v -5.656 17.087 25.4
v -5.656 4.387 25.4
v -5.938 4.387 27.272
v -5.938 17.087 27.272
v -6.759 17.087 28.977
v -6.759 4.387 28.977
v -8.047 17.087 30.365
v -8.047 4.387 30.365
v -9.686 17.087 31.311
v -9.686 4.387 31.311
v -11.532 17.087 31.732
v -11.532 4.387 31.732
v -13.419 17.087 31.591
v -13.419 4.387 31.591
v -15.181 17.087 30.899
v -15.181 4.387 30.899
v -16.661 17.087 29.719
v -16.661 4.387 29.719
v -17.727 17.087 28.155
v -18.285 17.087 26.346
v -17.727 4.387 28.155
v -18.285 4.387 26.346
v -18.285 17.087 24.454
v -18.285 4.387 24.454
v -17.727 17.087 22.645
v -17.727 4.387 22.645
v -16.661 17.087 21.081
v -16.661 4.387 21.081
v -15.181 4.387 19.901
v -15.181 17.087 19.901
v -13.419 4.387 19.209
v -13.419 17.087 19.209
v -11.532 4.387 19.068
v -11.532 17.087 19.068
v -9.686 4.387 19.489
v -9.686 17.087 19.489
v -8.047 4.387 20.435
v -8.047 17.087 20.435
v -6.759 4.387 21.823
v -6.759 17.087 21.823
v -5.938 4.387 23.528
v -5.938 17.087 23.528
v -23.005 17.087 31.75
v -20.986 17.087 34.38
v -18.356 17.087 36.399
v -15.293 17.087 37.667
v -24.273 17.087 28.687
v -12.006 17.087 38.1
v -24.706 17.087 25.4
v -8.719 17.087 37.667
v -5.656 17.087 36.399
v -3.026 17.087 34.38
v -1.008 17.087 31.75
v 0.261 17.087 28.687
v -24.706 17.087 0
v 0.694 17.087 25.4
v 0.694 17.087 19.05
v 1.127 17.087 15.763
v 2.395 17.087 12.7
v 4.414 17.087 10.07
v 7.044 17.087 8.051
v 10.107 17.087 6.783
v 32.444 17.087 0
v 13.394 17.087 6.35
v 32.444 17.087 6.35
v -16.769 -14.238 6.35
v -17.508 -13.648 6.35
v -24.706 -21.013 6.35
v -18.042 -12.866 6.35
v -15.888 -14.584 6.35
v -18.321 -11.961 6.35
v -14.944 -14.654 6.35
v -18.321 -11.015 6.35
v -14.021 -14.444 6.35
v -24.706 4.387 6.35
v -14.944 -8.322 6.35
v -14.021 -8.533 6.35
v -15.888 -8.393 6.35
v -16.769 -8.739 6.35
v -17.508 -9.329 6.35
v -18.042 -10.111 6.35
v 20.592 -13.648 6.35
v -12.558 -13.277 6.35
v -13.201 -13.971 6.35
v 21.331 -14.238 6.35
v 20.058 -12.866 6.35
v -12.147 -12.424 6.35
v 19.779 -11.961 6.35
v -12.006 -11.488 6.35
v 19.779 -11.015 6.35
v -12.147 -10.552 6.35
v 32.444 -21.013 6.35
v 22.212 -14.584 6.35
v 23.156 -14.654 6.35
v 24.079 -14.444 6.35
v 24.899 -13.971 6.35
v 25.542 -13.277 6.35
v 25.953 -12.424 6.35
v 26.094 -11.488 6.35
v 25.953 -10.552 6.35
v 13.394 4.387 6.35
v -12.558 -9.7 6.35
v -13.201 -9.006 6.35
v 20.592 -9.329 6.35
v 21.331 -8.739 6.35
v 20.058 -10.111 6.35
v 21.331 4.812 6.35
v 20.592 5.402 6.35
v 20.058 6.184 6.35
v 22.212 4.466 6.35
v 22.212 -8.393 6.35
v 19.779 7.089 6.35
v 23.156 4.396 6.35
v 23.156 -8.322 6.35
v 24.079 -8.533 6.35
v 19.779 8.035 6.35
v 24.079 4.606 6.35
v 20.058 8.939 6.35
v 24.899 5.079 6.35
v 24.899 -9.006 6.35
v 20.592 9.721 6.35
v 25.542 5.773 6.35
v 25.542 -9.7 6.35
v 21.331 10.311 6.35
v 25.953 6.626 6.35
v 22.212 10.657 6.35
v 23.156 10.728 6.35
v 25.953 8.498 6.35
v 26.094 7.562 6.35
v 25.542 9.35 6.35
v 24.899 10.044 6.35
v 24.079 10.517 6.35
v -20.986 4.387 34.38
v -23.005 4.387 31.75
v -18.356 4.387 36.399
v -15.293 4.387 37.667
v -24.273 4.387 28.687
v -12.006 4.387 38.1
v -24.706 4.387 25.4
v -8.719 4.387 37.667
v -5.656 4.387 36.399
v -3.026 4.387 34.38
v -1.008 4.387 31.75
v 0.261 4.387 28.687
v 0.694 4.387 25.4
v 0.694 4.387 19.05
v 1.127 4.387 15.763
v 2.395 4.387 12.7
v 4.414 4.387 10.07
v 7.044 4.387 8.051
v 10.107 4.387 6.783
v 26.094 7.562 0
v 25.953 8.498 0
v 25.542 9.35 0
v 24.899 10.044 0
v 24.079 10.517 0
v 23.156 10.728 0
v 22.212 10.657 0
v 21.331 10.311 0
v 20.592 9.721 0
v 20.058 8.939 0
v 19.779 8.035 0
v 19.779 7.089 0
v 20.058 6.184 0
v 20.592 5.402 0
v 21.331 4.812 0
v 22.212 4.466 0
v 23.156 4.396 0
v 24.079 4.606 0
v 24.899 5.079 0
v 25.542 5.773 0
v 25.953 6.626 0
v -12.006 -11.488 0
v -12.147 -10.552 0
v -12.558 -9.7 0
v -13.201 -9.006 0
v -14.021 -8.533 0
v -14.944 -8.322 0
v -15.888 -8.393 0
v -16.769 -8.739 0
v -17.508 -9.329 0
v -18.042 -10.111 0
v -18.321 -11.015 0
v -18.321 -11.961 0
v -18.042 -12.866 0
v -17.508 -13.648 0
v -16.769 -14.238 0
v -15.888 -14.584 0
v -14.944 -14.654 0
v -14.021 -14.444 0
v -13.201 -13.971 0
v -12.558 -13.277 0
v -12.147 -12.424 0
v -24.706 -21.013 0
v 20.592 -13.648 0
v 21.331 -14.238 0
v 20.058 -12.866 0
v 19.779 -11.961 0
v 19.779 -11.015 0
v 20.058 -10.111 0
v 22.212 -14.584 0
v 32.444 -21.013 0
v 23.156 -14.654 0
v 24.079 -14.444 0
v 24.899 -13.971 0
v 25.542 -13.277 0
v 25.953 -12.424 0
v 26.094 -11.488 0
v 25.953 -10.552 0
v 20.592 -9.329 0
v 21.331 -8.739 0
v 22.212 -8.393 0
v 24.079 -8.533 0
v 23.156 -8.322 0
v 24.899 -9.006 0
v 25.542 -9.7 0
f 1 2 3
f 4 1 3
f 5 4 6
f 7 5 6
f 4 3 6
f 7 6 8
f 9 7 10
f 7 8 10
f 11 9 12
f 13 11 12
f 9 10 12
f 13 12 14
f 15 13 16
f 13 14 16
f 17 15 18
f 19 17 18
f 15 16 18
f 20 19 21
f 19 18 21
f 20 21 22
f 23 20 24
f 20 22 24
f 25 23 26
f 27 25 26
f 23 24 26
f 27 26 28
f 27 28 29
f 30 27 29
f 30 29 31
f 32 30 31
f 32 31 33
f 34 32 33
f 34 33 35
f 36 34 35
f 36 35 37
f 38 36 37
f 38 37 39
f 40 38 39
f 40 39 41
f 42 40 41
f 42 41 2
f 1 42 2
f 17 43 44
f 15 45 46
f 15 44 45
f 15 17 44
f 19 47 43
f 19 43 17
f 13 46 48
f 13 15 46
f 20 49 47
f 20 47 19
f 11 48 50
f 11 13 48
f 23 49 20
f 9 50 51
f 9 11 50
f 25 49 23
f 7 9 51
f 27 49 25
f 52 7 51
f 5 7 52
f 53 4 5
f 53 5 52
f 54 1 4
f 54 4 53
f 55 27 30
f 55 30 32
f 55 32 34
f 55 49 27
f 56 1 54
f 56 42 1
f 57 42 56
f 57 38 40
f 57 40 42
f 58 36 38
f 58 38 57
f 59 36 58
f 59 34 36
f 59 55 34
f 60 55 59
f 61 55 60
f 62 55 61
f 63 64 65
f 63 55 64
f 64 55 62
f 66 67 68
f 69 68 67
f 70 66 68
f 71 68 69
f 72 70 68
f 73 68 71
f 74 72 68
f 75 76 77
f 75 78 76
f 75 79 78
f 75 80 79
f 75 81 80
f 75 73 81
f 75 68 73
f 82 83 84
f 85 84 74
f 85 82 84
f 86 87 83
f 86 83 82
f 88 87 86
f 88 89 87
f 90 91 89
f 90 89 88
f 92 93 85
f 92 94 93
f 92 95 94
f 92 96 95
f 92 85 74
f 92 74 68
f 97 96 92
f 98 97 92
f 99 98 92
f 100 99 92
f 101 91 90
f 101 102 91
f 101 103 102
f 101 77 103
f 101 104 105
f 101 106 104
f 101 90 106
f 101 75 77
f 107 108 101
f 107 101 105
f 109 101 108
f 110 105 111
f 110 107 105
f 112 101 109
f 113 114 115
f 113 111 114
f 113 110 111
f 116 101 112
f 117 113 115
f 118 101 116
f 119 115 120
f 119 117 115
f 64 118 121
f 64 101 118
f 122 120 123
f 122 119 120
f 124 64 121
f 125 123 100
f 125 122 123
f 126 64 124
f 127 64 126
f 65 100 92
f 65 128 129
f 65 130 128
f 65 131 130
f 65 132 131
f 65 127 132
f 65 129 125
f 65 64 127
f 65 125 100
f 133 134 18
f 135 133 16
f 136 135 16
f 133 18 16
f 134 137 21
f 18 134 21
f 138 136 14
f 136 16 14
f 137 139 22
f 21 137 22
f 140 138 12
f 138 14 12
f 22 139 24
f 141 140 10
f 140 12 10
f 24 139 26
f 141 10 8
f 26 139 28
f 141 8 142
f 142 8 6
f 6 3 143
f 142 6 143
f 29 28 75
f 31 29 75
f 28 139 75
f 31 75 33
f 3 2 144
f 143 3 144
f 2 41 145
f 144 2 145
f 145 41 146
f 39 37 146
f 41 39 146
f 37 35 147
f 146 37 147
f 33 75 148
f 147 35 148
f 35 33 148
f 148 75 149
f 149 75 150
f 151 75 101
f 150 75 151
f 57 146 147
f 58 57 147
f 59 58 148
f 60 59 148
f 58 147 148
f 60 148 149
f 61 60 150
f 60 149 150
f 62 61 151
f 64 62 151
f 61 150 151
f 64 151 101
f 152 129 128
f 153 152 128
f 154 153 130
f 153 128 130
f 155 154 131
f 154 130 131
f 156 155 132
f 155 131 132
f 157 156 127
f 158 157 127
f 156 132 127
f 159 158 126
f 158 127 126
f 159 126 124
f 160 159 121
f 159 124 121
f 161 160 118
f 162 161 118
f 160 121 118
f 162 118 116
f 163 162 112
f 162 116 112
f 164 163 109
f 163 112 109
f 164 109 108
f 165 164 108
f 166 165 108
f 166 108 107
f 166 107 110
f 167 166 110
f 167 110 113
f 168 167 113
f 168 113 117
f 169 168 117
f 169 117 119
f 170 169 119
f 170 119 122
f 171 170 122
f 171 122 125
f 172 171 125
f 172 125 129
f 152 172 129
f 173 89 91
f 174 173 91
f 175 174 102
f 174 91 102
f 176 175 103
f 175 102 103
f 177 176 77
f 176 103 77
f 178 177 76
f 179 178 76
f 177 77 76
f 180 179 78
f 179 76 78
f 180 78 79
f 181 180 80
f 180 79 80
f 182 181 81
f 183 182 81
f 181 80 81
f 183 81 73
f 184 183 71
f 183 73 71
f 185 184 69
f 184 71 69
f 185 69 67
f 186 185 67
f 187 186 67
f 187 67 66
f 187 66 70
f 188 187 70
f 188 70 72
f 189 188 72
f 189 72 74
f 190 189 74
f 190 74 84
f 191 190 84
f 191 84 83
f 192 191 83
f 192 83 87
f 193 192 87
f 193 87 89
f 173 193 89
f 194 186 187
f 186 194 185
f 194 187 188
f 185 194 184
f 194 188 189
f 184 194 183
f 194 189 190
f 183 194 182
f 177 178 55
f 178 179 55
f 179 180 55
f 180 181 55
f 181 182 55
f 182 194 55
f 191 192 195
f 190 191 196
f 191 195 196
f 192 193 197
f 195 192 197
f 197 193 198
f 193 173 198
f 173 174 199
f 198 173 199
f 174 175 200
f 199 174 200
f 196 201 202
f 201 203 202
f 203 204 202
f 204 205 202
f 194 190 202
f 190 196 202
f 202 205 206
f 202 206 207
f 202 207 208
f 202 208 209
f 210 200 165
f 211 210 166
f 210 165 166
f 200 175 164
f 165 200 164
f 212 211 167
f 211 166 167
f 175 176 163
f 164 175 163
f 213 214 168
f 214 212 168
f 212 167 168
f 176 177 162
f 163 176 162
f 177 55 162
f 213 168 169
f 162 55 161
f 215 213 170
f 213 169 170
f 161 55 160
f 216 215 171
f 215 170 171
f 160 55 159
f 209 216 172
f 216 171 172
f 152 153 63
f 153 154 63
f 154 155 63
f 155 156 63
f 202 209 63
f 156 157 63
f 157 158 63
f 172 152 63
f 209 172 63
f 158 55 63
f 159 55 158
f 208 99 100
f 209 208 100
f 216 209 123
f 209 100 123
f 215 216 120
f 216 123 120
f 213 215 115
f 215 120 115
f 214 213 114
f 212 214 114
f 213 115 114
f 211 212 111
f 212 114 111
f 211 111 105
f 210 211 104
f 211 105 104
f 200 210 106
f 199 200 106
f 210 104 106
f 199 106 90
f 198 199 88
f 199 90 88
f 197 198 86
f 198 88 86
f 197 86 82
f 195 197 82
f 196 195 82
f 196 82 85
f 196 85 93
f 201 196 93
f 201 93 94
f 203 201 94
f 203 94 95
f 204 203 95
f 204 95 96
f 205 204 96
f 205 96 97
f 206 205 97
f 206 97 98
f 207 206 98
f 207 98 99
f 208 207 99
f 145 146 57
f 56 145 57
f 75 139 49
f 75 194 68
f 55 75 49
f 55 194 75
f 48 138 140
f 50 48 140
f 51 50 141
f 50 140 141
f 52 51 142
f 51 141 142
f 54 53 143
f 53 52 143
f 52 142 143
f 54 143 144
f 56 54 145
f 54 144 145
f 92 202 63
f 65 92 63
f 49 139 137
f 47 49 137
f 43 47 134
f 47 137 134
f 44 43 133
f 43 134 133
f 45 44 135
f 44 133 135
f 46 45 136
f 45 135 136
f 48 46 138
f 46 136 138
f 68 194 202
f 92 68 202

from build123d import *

# Parameters (mm, degrees)
F0_W      = 57.15
F0_H      = 38.1
F1_DEPTH  = 6.35
F2_W      = 25.4
F2_H      = 12.7
F3_DEPTH  = 31.75
F4_R      = 6.35
F5_DEPTH  = 25.4
F6_W      = 12.7
F6_H      = 12.7
F7_DEPTH  = 12.7
F9_DEPTH  = 25.4
F10_R     = 3.175
F11_DEPTH = 25.4


with BuildPart() as f1:
    # F0 (on Top) → F1 (new body)
    with BuildSketch(Plane.XY):
        with Locations((3.8689542562, -1.9632895614)):
            Rectangle(F0_W, F0_H)
    extrude(amount=F1_DEPTH)

    # F2 (on face) → F3 (join)
    with BuildSketch(Plane.XY.offset(6.35)):
        with Locations((-12.0060457438, 10.7367104386)):
            Rectangle(F2_W, F2_H)
    extrude(amount=F3_DEPTH)

    # F4 (on face) → F5 (cut)
    with BuildSketch(Plane.XZ.offset(-4.3867104386)):
        with BuildLine():
            ThreePointArc((-24.7060457438, 25.4), (-20.9863018648, 34.380256121), (-12.0060457438, 38.0999999999))
            Line((-12.0060457438, 38.1), (-24.7060457438, 38.1))
            Line((-24.7060457438, 38.1), (-24.7060457438, 25.4))
        make_face()
        with BuildLine():
            ThreePointArc((-12.0060457438, 38.0999999999), (-3.0257896228, 34.3802561209), (0.6939542562, 25.3999999999))
            Line((0.6939542562, 25.3999999999), (0.6939542562, 38.1))
            Line((0.6939542562, 38.1), (-12.0060457438, 38.1))
        make_face()
        with Locations((-12.0060457438, 25.3999999999)):
            Circle(F4_R)
    extrude(amount=-F5_DEPTH, mode=Mode.SUBTRACT)

    # F6 (on face) → F7 (join)
    with BuildSketch(Plane.XY.offset(6.35)):
        with Locations((7.0439542562, 10.7367104386)):
            Rectangle(F6_W, F6_H)
    extrude(amount=F7_DEPTH)

    # F8 (on face) → F9 (cut)
    with BuildSketch(Plane.XZ.offset(-4.3867104386)):
        with BuildLine():
            Line((13.3939542562, 19.05), (0.6939542562, 19.05))
            ThreePointArc((0.6939542562, 19.05), (4.4136981351, 10.0697438789), (13.3939542562, 6.35))
            Line((13.3939542562, 6.35), (13.3939542562, 19.05))
        make_face()
    extrude(amount=-F9_DEPTH, mode=Mode.SUBTRACT)

    # F10 (on face) → F11 (cut)
    with BuildSketch(Plane.XY.offset(6.35)):
        with Locations((-15.1810457438, -11.4882895614)):
            Circle(F10_R)
        with Locations((22.9189542562, -11.4882895614)):
            Circle(F10_R)
        with Locations((22.9189542562, 7.5617104386)):
            Circle(F10_R)
    extrude(amount=-F11_DEPTH, mode=Mode.SUBTRACT)


solid = f1.part
